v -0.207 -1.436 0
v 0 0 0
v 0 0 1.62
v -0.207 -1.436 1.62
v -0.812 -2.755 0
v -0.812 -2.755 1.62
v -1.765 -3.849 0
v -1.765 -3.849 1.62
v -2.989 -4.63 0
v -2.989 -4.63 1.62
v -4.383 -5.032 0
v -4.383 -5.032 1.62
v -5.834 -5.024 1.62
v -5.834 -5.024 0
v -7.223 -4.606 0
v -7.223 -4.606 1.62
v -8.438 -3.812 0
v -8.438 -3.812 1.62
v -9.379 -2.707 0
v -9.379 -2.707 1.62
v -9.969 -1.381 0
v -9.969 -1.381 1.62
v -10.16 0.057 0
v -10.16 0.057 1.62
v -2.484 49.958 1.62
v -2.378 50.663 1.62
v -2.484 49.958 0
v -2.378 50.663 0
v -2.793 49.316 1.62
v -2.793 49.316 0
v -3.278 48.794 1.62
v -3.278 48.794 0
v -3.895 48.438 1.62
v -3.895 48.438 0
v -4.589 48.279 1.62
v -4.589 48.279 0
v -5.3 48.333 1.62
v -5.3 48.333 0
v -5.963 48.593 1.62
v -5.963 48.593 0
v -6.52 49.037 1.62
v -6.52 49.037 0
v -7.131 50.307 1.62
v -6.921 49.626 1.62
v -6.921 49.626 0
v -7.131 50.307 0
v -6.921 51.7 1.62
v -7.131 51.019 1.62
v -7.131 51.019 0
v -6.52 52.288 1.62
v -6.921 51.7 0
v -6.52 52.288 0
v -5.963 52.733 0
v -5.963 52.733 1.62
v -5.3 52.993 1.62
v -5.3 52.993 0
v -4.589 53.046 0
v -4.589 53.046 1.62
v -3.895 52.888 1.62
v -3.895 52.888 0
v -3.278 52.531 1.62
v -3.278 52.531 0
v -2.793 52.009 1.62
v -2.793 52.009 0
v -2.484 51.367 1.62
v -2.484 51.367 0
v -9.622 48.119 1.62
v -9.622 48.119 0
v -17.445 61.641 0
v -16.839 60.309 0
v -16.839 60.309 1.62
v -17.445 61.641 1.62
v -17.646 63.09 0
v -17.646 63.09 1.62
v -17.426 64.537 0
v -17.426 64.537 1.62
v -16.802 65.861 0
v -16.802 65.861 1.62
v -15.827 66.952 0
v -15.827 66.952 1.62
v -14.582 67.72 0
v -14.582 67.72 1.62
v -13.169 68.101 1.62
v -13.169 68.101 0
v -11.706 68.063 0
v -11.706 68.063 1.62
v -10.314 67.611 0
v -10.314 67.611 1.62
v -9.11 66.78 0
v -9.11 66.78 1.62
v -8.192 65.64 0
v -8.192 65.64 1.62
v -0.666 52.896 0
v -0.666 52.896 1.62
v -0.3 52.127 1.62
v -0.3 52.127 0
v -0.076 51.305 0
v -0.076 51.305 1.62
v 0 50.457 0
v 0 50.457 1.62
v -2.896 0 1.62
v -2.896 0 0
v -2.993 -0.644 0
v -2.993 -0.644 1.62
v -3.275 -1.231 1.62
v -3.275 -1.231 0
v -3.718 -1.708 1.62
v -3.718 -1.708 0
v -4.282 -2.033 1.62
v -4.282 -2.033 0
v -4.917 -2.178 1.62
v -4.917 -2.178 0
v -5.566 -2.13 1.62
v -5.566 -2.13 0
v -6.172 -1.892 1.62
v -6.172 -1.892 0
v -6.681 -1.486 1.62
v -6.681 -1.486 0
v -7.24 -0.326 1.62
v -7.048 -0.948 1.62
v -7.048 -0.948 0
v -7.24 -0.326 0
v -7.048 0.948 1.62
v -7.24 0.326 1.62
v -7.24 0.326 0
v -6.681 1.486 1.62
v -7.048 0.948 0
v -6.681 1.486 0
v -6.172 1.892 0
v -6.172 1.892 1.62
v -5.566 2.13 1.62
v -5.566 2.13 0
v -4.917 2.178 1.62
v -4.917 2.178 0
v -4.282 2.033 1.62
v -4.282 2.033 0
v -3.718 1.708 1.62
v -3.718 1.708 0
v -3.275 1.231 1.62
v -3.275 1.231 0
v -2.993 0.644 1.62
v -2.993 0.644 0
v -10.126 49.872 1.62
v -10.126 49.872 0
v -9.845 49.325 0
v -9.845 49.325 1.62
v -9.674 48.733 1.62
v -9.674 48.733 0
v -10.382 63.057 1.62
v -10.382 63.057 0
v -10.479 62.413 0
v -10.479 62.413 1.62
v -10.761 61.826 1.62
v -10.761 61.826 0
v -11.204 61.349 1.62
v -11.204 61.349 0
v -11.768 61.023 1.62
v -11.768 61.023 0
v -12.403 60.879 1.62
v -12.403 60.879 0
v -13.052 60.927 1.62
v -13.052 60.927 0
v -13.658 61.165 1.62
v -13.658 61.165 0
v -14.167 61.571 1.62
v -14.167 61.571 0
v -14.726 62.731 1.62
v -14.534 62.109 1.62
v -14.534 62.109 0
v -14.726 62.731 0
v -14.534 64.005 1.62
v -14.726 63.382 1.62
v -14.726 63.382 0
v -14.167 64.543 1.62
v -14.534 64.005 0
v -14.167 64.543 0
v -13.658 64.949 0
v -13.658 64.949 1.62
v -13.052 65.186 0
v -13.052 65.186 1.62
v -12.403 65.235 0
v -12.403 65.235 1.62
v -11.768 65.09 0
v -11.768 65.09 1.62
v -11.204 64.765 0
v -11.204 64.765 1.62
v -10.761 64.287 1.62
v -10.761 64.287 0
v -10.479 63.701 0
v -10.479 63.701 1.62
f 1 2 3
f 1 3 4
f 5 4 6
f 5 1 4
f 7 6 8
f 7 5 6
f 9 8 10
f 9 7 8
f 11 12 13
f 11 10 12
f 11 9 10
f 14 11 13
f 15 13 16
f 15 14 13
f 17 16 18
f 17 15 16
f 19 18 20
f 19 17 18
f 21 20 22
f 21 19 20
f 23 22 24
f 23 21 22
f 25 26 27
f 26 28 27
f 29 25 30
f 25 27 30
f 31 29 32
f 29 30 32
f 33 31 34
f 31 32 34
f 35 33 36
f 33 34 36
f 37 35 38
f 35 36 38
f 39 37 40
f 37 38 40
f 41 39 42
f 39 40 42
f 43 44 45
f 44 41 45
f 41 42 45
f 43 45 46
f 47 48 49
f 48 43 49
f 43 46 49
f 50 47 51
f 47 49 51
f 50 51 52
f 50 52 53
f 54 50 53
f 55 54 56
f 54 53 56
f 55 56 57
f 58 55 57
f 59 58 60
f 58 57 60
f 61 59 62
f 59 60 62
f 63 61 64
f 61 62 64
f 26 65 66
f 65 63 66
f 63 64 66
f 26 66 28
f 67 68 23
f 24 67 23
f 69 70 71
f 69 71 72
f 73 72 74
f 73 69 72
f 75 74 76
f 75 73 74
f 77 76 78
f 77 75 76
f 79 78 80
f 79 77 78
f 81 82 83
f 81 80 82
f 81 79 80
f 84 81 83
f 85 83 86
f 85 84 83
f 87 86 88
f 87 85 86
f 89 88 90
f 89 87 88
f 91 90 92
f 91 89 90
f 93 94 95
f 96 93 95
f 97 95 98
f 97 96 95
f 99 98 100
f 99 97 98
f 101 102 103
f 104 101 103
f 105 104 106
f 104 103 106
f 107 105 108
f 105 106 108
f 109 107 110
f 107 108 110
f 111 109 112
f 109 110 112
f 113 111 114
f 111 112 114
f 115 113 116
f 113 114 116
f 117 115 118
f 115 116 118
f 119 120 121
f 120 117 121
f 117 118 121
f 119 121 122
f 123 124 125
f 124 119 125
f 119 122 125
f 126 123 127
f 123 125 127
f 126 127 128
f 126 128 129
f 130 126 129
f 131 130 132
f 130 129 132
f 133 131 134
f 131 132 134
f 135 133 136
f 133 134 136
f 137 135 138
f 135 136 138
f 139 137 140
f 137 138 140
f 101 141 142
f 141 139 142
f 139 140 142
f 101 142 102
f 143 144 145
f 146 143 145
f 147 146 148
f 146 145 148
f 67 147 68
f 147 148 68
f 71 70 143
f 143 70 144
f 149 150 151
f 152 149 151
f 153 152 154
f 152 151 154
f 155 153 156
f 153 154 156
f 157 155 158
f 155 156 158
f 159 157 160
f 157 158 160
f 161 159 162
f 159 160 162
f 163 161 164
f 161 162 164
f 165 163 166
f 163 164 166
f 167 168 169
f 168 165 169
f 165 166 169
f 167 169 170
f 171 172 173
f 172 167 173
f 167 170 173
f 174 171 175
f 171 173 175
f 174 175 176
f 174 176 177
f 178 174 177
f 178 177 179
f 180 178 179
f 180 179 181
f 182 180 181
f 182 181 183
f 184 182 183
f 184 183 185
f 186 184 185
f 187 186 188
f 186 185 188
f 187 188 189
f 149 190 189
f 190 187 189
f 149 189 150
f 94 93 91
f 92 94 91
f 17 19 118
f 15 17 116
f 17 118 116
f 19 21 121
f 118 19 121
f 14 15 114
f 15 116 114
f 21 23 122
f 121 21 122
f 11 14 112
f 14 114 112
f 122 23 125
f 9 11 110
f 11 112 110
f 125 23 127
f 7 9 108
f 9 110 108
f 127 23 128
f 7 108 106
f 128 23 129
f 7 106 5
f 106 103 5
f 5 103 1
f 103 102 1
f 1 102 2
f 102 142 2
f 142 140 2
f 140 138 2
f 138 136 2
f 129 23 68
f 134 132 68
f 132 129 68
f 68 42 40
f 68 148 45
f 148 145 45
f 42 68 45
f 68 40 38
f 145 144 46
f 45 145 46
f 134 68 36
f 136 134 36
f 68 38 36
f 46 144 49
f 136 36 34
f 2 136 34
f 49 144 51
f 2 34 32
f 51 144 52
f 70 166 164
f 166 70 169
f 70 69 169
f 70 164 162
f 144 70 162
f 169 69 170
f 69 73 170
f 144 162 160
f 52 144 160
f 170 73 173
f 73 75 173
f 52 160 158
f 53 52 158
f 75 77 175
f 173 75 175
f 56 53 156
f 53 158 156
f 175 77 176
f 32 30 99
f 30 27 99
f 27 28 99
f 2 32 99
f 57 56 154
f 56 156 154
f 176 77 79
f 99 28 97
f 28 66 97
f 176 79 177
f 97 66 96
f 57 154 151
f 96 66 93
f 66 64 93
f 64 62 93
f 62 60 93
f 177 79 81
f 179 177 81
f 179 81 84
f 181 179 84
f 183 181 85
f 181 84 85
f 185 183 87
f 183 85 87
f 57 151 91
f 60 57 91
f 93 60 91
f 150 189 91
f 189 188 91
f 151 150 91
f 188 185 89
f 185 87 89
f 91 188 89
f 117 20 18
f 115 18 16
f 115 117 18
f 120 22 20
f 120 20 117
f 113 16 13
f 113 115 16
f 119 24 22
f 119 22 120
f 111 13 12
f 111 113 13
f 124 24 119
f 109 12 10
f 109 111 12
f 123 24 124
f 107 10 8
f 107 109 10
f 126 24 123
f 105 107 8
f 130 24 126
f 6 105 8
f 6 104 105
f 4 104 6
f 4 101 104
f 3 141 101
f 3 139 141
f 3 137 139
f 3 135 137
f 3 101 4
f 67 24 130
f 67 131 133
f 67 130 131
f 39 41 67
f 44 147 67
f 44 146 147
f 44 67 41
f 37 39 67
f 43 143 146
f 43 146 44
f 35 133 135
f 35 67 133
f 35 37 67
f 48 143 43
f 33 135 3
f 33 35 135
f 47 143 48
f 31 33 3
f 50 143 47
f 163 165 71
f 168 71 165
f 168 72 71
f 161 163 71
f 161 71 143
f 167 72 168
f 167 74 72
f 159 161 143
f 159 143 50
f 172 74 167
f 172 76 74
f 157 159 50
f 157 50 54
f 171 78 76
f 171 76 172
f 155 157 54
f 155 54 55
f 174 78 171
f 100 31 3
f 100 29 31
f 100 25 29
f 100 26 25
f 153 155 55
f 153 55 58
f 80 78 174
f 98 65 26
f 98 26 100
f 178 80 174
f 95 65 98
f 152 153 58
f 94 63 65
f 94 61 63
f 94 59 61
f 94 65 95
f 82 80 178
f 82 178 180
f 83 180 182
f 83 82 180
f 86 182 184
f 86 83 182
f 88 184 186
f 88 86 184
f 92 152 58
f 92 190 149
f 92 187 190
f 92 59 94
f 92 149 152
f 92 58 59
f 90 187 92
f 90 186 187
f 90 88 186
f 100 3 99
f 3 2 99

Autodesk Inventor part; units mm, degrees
ref_plane "YZ Plane" through (0, 0, 0) normal (1, 0, 0) x (0, 1, 0)
ref_plane "XZ Plane" through (0, 0, 0) normal (0, 1, 0) x (-1, 0, 0)
ref_plane "XY Plane" through (0, 0, 0) normal (0, 0, 1) x (1, 0, 0)
sketch "Sketch2" plane through (0, 0, 0) normal (0, 0, 1) x (1, 0, 0)
  circle A0 centre (-4.7681, 50.6628) radius 2.39
  circle A1 centre (-4.7681, 50.6628) radius 2.39
  circle A2 centre (-5.08, 0) radius 2.1844
  circle A3 centre (-12.5662, 63.0568) radius 2.1844
  arc A4 (-10.1597, 0.0569) -> (0, 0) centre (-5.08, 0) ccw
  arc A5 (-8.1919, 65.6399) -> (-16.8387, 60.3087) centre (-12.5662, 63.0568) ccw
  line L0 (-16.8387, 60.3087) -> (-10.1261, 49.8724)
  line L1 (-0.6665, 52.8961) -> (-8.1919, 65.6399)
  line L2 (0, 0) -> (0, 50.4566)
  arc A6 (0, 50.4566) -> (-0.6665, 52.8961) centre (-4.7976, 50.4566) ccw
  line L3 (-9.6216, 48.1193) -> (-10.1597, 0.0569)
  arc A7 (-9.6216, 48.1193) -> (-10.1261, 49.8724) centre (-12.7964, 48.1549) ccw
  circle A8 centre (-12.5662, 63.0568) radius 2.1844
  circle A9 centre (-5.08, 0) radius 2.1844
  arc A10 (-10.1597, 0.0569) -> (0, 0) centre (-5.08, 0) ccw
  line L4 (-10.1597, 0.0569) -> (-9.6216, 48.1193)
  line L5 (-10.1261, 49.8724) -> (-16.8387, 60.3087)
  arc A11 (-9.6216, 48.1193) -> (-10.1261, 49.8724) centre (-12.7964, 48.1549) ccw
  arc A12 (-8.1919, 65.6399) -> (-16.8387, 60.3087) centre (-12.5662, 63.0568) ccw
  line L6 (-8.1919, 65.6399) -> (-0.6665, 52.8961)
extrude "Extrusion4" add sketch "Sketch2" along normal blind 1.62
properties part number "pneumaticwingplexi"
